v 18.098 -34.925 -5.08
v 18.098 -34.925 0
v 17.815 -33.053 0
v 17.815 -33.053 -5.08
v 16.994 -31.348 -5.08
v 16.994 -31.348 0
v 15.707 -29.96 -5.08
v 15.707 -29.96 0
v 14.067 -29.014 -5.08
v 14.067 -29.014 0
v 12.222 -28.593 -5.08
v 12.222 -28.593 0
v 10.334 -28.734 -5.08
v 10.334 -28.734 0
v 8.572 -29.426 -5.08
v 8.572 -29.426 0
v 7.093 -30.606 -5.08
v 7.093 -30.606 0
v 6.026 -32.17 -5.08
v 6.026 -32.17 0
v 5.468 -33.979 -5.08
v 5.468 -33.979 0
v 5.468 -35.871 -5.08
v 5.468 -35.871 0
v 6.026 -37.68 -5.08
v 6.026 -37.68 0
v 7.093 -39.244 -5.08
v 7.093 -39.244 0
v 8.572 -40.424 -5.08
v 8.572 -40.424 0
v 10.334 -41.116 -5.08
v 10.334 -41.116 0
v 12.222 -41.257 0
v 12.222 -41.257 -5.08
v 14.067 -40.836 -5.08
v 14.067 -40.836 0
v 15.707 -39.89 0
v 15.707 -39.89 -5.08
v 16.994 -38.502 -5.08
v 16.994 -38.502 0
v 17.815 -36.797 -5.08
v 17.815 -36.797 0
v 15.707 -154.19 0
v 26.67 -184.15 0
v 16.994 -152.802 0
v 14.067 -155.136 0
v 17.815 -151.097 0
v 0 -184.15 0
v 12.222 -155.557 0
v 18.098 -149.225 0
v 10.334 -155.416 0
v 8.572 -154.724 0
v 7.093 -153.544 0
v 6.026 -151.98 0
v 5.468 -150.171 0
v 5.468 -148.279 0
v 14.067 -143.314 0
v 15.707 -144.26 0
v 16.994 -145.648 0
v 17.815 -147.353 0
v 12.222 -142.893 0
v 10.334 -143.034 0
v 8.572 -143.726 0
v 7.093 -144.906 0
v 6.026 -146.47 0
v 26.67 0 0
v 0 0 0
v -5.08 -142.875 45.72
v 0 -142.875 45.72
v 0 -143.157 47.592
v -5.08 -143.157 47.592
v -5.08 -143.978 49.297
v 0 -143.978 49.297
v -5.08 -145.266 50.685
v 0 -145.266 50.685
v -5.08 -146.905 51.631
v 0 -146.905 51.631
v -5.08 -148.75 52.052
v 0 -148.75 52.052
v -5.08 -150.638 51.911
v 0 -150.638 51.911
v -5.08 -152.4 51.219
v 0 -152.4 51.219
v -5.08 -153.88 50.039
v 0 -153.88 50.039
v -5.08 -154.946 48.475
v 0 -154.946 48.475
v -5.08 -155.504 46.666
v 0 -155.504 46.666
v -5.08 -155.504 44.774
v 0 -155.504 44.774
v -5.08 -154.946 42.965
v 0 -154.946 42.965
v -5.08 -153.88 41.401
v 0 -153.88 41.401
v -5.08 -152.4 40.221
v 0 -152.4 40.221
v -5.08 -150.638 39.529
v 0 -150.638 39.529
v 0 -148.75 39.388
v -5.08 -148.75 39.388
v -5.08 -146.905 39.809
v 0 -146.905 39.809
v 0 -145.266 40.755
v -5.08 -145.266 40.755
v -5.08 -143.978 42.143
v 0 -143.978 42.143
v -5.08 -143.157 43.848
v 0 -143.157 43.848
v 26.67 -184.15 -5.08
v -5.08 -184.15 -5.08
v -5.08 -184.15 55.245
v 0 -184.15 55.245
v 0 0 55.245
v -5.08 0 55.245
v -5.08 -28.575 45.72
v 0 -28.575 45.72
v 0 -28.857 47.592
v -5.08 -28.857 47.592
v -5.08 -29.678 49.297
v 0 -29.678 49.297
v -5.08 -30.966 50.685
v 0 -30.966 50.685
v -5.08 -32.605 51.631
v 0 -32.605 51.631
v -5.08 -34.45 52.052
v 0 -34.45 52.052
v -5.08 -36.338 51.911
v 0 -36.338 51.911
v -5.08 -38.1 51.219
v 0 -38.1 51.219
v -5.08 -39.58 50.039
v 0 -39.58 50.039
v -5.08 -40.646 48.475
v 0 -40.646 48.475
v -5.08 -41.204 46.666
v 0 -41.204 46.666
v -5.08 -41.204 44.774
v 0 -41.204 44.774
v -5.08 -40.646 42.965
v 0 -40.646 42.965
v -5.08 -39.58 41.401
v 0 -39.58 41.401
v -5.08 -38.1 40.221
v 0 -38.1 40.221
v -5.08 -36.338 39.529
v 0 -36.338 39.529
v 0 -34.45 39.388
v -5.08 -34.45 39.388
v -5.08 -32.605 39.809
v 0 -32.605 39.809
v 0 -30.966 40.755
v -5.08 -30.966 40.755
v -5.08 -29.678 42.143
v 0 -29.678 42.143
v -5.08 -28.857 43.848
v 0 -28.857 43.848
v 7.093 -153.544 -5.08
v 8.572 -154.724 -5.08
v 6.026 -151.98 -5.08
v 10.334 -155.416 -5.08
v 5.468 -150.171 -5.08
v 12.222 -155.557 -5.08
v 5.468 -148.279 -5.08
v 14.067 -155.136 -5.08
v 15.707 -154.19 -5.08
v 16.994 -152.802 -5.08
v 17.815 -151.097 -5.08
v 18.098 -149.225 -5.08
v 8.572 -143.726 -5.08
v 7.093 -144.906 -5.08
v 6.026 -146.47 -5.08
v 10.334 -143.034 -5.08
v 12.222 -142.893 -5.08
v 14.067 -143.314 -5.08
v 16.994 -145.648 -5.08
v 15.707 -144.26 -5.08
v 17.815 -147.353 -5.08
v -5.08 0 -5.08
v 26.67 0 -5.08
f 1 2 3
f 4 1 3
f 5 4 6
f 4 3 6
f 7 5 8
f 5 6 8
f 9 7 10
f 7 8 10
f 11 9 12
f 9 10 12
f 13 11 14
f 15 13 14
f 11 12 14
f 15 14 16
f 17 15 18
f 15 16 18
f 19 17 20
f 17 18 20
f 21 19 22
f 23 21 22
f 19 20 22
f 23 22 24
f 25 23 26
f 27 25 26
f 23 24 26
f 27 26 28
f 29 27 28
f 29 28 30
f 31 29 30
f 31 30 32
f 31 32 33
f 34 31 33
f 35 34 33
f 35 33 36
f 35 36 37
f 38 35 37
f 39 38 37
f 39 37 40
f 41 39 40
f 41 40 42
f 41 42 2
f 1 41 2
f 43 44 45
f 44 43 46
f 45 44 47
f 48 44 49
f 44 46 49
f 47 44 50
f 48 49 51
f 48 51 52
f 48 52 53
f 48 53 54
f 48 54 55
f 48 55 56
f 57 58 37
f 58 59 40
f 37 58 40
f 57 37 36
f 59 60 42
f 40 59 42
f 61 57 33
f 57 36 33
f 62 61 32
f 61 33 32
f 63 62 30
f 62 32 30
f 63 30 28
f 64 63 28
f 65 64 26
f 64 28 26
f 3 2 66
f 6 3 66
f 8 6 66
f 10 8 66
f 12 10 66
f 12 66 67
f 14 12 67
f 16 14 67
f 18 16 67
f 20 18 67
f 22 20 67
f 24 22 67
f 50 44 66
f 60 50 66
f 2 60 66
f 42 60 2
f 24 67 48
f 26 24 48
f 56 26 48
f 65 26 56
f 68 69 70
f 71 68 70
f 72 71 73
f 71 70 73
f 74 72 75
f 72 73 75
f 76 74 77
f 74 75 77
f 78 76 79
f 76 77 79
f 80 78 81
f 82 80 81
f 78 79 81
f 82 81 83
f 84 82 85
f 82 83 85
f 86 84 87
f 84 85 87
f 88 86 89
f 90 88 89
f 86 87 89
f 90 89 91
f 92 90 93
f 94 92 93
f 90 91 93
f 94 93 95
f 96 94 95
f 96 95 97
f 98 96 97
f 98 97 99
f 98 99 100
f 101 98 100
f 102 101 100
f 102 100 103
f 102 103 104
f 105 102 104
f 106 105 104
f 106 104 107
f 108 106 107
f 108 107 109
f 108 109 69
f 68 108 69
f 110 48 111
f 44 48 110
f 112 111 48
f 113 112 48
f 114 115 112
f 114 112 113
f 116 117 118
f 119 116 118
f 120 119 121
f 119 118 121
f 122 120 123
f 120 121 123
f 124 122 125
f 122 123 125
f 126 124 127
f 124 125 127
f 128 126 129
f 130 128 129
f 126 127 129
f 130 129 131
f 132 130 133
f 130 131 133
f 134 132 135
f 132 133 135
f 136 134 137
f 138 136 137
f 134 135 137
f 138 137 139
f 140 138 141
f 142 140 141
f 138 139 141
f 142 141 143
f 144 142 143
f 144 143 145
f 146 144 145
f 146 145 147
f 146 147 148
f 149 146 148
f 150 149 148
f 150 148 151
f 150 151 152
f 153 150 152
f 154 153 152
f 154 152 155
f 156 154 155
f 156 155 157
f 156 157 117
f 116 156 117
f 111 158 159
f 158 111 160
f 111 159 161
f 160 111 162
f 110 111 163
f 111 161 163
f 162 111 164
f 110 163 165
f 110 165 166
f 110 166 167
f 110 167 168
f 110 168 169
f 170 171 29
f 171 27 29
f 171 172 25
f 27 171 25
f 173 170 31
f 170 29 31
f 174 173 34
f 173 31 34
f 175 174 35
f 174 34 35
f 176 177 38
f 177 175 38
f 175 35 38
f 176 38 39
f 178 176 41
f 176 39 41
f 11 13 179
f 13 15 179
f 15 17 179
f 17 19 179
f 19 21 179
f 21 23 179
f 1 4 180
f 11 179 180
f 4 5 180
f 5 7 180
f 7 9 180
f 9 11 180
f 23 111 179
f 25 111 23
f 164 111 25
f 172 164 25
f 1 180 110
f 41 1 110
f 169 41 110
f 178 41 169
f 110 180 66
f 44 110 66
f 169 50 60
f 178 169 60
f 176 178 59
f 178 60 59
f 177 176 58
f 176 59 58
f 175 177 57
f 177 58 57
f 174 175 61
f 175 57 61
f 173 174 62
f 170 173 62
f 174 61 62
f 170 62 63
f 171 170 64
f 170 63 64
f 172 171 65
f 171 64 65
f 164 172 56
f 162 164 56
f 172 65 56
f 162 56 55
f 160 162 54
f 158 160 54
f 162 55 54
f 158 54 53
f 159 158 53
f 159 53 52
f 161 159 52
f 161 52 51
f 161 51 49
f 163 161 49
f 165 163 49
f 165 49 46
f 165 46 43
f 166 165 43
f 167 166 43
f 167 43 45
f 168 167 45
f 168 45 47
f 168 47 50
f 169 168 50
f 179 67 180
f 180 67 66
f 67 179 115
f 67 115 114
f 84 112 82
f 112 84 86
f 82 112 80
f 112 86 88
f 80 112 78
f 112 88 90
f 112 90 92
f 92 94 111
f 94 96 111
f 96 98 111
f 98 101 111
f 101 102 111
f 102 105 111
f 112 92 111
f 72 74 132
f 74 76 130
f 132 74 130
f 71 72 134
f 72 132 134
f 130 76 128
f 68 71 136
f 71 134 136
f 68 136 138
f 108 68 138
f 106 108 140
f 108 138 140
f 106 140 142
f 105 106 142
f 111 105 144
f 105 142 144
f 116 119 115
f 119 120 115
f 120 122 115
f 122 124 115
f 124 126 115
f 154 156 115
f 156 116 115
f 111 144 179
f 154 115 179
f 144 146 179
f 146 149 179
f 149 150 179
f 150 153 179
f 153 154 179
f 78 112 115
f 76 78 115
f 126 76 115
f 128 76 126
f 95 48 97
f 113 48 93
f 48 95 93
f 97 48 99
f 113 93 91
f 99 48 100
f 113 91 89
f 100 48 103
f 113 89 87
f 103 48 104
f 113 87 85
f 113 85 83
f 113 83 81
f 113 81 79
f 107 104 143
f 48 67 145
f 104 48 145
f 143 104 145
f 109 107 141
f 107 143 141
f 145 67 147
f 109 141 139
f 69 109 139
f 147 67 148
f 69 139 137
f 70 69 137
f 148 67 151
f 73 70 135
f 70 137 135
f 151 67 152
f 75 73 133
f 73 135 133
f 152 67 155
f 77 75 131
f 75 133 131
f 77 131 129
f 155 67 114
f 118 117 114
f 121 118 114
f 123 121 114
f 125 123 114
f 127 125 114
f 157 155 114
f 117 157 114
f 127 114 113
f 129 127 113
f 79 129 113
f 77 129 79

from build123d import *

# Parameters (mm, degrees)
F0_W     = 5.08
F0_H     = 55.245
F1_DEPTH = 184.15
F2_R     = 6.35
F3_DEPTH = 25.4
F4_R     = 6.35
F5_DEPTH = 25.4


with BuildPart() as f1:
    # F0 (on Front) → F1 (new body)
    with BuildSketch(Plane.XZ):
        Polygon((26.67, 0), (0, 0), (-5.08, 0), (-5.08, -5.08), (26.67, -5.08), align=None)
        with Locations((-2.54, 27.6225)):
            Rectangle(F0_W, F0_H)
    extrude(amount=F1_DEPTH)

    # F2 (on face) → F3 (cut)
    with BuildSketch(Plane.YZ):
        with Locations((-149.225, 45.72)):
            Circle(F2_R)
        with Locations((-34.925, 45.72)):
            Circle(F2_R)
    extrude(amount=-F3_DEPTH, mode=Mode.SUBTRACT)

    # F4 (on face) → F5 (cut)
    with BuildSketch(Plane.XY):
        with Locations((11.7475, -149.225)):
            Circle(F4_R)
        with Locations((11.7475, -34.925)):
            Circle(F4_R)
    extrude(amount=-F5_DEPTH, mode=Mode.SUBTRACT)


solid = f1.part
